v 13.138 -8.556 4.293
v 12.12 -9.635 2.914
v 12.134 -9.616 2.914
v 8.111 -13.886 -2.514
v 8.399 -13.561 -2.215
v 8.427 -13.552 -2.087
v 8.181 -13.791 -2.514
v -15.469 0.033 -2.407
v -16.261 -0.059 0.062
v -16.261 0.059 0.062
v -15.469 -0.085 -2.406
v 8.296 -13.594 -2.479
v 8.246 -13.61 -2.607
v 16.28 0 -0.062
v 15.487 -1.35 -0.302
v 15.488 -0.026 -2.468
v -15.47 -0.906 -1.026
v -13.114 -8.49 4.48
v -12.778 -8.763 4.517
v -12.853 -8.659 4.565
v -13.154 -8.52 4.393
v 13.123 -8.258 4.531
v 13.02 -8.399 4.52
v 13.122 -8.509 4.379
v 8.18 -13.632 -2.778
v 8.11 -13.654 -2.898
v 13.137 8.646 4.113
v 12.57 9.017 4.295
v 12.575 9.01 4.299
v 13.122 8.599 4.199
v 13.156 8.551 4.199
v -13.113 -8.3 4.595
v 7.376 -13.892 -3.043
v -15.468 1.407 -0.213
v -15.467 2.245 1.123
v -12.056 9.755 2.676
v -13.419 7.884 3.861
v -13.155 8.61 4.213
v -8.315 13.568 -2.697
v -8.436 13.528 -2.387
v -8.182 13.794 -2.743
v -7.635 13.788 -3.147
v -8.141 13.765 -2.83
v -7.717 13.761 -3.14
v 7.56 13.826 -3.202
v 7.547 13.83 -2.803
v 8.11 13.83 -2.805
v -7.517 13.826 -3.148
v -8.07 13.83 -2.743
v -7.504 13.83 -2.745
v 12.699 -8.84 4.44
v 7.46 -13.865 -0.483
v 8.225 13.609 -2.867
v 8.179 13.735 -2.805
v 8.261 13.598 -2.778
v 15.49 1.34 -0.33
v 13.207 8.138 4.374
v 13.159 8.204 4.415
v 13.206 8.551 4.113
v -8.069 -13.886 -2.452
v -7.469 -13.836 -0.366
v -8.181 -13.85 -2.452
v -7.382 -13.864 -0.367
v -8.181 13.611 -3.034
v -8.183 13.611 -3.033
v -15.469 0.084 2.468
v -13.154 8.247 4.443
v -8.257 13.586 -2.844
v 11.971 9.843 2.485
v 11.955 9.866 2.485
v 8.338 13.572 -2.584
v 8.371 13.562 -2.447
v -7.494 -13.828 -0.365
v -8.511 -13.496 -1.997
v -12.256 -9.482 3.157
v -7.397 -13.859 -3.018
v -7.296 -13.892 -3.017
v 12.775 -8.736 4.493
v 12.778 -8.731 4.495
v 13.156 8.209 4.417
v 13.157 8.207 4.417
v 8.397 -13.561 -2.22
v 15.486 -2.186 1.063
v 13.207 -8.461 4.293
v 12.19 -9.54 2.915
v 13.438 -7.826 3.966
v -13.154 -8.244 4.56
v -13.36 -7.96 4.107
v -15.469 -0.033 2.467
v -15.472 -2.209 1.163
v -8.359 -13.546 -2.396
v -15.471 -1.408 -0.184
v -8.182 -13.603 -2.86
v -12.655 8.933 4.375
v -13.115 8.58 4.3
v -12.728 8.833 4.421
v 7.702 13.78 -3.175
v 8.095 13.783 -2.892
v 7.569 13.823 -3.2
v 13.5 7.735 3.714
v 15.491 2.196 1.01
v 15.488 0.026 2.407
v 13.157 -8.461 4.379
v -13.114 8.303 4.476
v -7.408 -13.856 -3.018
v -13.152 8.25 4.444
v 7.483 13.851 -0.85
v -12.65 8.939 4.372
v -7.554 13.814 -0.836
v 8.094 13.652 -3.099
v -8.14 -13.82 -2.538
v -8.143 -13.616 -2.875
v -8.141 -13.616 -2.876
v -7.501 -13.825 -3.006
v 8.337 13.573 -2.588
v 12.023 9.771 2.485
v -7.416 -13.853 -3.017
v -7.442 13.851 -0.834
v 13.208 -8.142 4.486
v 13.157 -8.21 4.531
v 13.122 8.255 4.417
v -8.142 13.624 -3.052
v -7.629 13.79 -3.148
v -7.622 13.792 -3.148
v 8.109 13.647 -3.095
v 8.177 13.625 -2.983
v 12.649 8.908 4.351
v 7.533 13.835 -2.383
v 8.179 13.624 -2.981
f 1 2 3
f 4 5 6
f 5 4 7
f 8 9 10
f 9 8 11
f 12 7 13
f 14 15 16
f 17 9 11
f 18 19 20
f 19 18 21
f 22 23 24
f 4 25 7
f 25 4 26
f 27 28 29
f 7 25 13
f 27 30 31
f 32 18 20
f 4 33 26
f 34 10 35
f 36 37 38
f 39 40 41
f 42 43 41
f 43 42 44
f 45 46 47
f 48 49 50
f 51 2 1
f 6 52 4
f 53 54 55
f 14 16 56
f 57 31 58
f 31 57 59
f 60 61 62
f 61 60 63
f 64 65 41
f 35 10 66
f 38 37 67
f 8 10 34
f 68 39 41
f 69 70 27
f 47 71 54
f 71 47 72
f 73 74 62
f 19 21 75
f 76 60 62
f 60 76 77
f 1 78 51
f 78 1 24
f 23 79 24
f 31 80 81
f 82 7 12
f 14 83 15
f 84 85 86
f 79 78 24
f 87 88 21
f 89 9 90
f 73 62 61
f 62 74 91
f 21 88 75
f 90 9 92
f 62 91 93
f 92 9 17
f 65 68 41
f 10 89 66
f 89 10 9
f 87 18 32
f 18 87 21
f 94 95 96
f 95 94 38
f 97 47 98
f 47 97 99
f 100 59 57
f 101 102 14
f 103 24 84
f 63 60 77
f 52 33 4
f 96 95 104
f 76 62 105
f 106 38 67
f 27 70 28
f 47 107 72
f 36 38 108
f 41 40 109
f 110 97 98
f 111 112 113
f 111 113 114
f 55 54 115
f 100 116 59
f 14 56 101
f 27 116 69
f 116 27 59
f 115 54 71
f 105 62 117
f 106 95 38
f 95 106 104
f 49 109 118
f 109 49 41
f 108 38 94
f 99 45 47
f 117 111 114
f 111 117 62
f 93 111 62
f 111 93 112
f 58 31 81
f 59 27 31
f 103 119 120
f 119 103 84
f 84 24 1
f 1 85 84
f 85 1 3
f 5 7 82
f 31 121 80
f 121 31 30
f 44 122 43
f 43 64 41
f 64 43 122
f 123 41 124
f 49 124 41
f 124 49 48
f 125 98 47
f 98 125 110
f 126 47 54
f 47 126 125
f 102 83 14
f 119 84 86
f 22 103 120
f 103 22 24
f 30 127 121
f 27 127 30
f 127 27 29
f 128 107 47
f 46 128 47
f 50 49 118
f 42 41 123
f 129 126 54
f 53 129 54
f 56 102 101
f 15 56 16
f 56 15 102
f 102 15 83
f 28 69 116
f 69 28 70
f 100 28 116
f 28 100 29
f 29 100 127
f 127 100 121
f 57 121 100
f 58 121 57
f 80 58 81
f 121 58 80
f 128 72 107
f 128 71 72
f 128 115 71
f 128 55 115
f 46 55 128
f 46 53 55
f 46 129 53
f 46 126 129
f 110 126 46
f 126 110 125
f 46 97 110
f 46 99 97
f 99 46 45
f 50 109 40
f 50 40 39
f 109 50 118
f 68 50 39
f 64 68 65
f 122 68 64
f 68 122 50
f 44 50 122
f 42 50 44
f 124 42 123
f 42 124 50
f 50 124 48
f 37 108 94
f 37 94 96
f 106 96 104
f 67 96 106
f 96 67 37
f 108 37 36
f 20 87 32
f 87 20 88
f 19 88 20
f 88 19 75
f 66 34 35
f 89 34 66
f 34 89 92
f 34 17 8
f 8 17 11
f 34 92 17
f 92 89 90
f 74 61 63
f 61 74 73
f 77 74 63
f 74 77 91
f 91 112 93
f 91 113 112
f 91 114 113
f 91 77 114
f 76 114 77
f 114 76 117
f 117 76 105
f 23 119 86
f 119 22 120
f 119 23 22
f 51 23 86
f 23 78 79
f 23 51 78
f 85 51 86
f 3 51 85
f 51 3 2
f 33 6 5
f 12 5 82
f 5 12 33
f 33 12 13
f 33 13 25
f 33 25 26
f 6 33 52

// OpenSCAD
// Auto-generated OpenSCAD file

    inner_points = 10*[[-0.0016418331039271756, -1.6180331557585443, -9.663416068995967e-15], [0.0016418331039271756, 1.6180331557585443, 9.663416068995967e-15], [-0.9523842975581269, -1.3080512751855748, 1.785566891566374e-13], [0.949727755792118, -1.3099813657560027, -1.9419242480370474e-13], [-0.949727755792118, 1.3099813657560027, 1.9419242480370474e-13], [0.9523842975581269, 1.3080512751855748, -1.785566891566374e-13], [-1.5393483306968156, -0.49843826651935746, 2.9857420804308504e-13], [1.5383336220347341, -0.5015612186636755, -3.045465276211565e-13], [-1.5383336220347341, 0.5015612186636755, 3.045465276211565e-13], [1.5393483306968156, 0.49843826651935746, -2.9857420804308504e-13], [-0.2636863372841518, -0.8087498459225672, -1.376381920471127], [-0.26368633728361235, -0.808749845922584, 1.3763819204712202], [-0.2620445041802246, 0.8092833098359772, -1.3763819204711172], [-0.26204450417968517, 0.8092833098359603, 1.37638192047123], [0.6876832516118934, -0.5006980559200255, -1.3763819204713112], [0.6876832516124327, -0.5006980559200425, 1.376381920471036], [0.6886979602739751, 0.49930142926300763, -1.3763819204713055], [0.6886979602745145, 0.49930142926299065, 1.3763819204710417], [-0.8506503704228404, 0.0008631627436501369, -1.3763819204710068], [-0.8506503704223011, 0.0008631627436331492, 1.3763819204713403], [0.4239969143281142, -1.3094479018426044, -0.850650808352131], [0.4239969143284476, -1.3094479018426148, 0.8506508083519487], [0.42665345609412314, 1.308584739098973, -0.8506508083521155], [0.42665345609445654, 1.3085847390989627, 0.8506508083519643], [-1.1143367077066197, -0.8078866831789286, -0.8506508083518266], [-1.1143367077062865, -0.8078866831789392, 0.8506508083522532], [-1.1126948746026926, 0.8101464725796157, -0.8506508083518168], [-1.1126948746023593, 0.8101464725796051, 0.8506508083522629], [1.376381211886241, -0.0013966266570295412, -0.8506508083523096], [1.3763812118865746, -0.0013966266570400404, 0.8506508083517702]];

    outer_points = 10*[[1.6180220198478508, 0.0, -0.006223506839090811], [-1.6180220198478508, 0.0, 0.006223506839090811], [1.3053494309833273, -0.010073202420207877, -0.9560310572227243], [1.3126651916762522, 0.010073202420207877, 0.9459612116278578], [-1.3126651916762522, -0.010073202420207877, -0.9459612116278578], [-1.3053494309833273, 0.010073202420207877, 0.9560310572227243], [0.4940777266785081, -0.016298783891454047, -1.5406672380477728], [0.5059148761332206, 0.016298783891454047, 1.5368208992919972], [-0.5059148761332206, -0.016298783891454047, -1.5368208992919972], [-0.4940777266785081, 0.016298783891454047, 1.5406672380477728], [0.8079439244447668, 1.3735205511194541, -0.28053858799672193], [0.8080560688782716, -1.3790888804671222, -0.2513826526847642], [-0.810078095403084, 1.3735205511194541, -0.27431508115763115], [-0.8099659509695791, -1.3790888804671222, -0.2451591458456734], [0.5025870962731682, 1.383593753539662, 0.6716461304702268], [0.5026992407066729, -1.3690156780469143, 0.7008020657821845], [-0.4974055065385606, 1.383593753539662, 0.6754924692260023], [-0.4972933621050558, -1.3690156780469143, 0.70464840453796], [-0.003327779860052472, 1.3672949696482082, -0.8651747688217704], [-0.0032156354265477157, -1.3853144619383682, -0.8360188335098125], [1.3106085106156622, 0.8551079663095562, 0.41125379828717096], [1.3106778196872173, -0.8460982201644762, 0.42927315728375415], [-1.3074061120439173, 0.8551079663095562, 0.4213236438820373], [-1.3073368029723622, -0.8460982201644762, 0.4393430028786205], [0.8046936344824416, 0.8388091824181022, -1.1255671010048263], [0.8047629435539967, -0.8623970040559302, -1.1075477420082434], [-0.8133283853654092, 0.8388091824181022, -1.1193435941657353], [-0.8132590762938541, -0.8623970040559302, -1.1013242351691523], [0.005259079632334848, 0.8651811687297641, 1.3672848555098953], [0.00532838870388989, -0.8360250177442683, 1.3853042145064782]];

    // Convex hull for inner set (I)
    module inner_hull() {
        hull() {
            for (p = inner_points) {
                translate(p) sphere(r=0.1);
            }
        }
    }

    // Convex hull for outer set (O) minus inner hull (O \ I)
    module outer_minus_inner() {
        difference() {
            hull() {
                for (p = outer_points) {
                    translate(p) sphere(r=0.1);
                }
            }
            inner_hull(); // Subtract inner hull
        }
    }

    // Convex hull for outer set (O) minus all translated inner hulls
    module outer_minus_AllTranslationInner() {
        difference() {
            hull() {
                for (p = outer_points) {
                    translate(p) sphere(r=0.1);
                }
            }
            hull() {
                translate([0,0,50]) inner_hull();
                translate([0,0,-50]) inner_hull();
            }; // Subtract translated inner hulls
        }
    }

    // Difference between outer_minus_inner and outer_minus_AllTranslationInner
    module outer_minus_inner_diff() {
        difference() {
            // Outer minus inner
            difference() {
                hull() {
                    for (p = outer_points) {
                        translate(p) sphere(r=0.1);
                    }
                }
                inner_hull();
            }

            // Subtract Outer minus AllTranslationInner
            difference() {
                hull() {
                    for (p = outer_points) {
                        translate(p) sphere(r=0.1);
                    }
                }
                hull() {
                    translate([0,0,50]) inner_hull();
                    translate([0,0,-50]) inner_hull();
                };
            }
        }
    }

    // Rendering all with colors applied
    color([0, 1, 0, 1]) outer_minus_AllTranslationInner(); // Opaque green
    
